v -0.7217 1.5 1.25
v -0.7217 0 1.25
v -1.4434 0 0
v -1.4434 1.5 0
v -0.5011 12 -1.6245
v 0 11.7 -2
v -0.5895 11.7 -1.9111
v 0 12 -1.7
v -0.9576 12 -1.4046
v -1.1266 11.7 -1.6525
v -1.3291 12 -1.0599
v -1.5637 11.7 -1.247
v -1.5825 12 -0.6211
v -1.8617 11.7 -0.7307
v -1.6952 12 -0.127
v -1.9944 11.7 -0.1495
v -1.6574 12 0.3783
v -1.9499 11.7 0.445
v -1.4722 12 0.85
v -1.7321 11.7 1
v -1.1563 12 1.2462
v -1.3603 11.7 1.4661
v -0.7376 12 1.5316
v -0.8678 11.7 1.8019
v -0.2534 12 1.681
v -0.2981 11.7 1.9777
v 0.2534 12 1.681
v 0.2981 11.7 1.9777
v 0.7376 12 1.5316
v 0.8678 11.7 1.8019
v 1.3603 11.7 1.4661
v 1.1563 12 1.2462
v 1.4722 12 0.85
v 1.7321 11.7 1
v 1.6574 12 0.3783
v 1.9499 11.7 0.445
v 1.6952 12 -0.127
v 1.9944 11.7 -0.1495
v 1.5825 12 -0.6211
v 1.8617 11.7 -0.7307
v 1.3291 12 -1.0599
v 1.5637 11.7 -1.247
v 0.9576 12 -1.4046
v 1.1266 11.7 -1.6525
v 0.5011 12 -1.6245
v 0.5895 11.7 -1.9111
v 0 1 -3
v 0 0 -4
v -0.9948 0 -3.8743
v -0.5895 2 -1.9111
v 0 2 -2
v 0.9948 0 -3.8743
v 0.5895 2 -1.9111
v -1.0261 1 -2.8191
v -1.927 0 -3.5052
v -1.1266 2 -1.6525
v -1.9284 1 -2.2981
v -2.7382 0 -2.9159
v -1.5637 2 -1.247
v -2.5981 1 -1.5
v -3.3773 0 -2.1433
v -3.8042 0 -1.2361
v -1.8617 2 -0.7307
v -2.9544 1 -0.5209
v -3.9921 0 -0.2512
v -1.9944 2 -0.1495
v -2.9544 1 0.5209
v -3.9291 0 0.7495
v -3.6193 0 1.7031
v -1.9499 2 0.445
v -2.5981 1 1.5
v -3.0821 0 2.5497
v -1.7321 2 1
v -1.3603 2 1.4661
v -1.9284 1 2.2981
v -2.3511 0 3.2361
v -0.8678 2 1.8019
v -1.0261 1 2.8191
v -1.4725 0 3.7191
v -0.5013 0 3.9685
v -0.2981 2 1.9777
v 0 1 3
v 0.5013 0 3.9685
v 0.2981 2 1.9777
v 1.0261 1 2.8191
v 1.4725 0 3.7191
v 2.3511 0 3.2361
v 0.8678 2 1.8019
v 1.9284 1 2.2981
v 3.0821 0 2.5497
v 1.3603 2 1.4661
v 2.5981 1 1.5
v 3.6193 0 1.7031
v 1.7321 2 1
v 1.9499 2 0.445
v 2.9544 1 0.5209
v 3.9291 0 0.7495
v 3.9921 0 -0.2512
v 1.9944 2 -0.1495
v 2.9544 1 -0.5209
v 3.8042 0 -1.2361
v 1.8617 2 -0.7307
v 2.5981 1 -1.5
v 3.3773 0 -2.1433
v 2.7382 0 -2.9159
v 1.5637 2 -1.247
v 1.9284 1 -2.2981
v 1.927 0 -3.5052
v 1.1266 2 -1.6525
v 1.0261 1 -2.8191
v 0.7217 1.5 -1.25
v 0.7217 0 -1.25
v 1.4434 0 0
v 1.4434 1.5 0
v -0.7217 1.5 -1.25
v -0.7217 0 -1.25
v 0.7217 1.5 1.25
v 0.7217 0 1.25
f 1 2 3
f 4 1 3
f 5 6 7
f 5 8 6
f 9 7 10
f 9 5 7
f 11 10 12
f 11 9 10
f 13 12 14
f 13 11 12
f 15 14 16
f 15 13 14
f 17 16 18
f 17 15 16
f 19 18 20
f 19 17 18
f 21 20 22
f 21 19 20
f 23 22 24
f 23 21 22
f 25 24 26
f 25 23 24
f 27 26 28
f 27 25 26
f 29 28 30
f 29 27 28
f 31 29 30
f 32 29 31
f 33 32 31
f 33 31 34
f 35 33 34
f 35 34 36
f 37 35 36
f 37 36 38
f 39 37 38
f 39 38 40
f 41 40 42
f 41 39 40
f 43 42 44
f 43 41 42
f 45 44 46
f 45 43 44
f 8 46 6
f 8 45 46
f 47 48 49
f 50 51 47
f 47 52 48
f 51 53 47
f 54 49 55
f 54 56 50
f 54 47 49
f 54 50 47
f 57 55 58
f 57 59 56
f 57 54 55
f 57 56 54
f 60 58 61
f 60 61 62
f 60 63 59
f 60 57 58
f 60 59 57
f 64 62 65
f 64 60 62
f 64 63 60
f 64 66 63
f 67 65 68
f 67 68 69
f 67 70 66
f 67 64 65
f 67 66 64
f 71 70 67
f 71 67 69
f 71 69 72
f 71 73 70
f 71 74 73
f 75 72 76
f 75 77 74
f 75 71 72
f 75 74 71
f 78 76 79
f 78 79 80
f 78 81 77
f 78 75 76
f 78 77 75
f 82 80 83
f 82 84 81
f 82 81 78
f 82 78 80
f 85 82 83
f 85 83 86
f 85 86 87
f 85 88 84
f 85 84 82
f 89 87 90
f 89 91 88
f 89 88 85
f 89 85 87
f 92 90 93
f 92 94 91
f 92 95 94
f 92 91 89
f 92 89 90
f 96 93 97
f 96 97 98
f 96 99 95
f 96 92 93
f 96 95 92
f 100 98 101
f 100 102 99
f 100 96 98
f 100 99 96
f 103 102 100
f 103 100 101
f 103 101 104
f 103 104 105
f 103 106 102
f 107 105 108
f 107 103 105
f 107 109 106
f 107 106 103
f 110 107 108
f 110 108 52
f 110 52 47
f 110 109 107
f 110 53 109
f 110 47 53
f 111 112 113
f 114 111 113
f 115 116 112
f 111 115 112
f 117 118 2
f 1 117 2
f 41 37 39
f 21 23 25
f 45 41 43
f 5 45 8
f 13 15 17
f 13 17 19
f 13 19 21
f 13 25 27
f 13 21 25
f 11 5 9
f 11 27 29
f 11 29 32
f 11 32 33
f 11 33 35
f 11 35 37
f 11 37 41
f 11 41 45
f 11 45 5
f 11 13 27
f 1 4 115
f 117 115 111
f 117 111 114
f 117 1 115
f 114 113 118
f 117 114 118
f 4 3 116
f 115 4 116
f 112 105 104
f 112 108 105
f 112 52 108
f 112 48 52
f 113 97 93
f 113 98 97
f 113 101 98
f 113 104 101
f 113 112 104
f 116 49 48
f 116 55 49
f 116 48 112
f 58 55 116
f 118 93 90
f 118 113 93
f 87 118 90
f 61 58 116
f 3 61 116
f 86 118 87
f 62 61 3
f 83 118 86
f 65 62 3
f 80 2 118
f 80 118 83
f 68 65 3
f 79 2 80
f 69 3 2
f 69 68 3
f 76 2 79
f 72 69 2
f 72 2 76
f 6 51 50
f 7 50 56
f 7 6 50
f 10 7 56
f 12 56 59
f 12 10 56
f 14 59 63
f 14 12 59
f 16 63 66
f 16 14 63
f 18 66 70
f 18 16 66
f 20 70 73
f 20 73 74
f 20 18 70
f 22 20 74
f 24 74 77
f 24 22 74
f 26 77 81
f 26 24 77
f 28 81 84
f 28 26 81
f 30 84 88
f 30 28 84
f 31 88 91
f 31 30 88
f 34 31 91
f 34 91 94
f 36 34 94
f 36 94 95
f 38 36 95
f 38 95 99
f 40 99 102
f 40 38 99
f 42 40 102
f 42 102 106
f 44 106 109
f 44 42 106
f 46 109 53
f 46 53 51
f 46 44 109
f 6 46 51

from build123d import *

# Parameters (mm, degrees)
CUT_EXTRUDE_316_DEPTH = 1.5


with BuildPart() as part:
    # Sketch 184 → Revolve 217 (revolve)
    with BuildSketch(Plane.XY, mode=Mode.PRIVATE) as revolve_217_sk:
        Polygon((0, 0), (4, 0), (2, 2), (2, 11.7), (1.7, 12), (0, 12), align=None)
    revolve(revolve_217_sk.sketch.rotate(Axis((0, -2, 0), (0, 1, 0)), 90), axis=Axis((0, -2, 0), (0, 1, 0)))

    # Sketch 268 → Cut-Extrude 316 (cut)
    with BuildSketch(Plane.XZ):
        Polygon((1.443375673, 0), (0.721687836, 1.25), (-0.721687836, 1.25), (-1.443375673, 0), (-0.721687836, -1.25), (0.721687836, -1.25), align=None)
    extrude(amount=-CUT_EXTRUDE_316_DEPTH, mode=Mode.SUBTRACT)


solid = part.part
